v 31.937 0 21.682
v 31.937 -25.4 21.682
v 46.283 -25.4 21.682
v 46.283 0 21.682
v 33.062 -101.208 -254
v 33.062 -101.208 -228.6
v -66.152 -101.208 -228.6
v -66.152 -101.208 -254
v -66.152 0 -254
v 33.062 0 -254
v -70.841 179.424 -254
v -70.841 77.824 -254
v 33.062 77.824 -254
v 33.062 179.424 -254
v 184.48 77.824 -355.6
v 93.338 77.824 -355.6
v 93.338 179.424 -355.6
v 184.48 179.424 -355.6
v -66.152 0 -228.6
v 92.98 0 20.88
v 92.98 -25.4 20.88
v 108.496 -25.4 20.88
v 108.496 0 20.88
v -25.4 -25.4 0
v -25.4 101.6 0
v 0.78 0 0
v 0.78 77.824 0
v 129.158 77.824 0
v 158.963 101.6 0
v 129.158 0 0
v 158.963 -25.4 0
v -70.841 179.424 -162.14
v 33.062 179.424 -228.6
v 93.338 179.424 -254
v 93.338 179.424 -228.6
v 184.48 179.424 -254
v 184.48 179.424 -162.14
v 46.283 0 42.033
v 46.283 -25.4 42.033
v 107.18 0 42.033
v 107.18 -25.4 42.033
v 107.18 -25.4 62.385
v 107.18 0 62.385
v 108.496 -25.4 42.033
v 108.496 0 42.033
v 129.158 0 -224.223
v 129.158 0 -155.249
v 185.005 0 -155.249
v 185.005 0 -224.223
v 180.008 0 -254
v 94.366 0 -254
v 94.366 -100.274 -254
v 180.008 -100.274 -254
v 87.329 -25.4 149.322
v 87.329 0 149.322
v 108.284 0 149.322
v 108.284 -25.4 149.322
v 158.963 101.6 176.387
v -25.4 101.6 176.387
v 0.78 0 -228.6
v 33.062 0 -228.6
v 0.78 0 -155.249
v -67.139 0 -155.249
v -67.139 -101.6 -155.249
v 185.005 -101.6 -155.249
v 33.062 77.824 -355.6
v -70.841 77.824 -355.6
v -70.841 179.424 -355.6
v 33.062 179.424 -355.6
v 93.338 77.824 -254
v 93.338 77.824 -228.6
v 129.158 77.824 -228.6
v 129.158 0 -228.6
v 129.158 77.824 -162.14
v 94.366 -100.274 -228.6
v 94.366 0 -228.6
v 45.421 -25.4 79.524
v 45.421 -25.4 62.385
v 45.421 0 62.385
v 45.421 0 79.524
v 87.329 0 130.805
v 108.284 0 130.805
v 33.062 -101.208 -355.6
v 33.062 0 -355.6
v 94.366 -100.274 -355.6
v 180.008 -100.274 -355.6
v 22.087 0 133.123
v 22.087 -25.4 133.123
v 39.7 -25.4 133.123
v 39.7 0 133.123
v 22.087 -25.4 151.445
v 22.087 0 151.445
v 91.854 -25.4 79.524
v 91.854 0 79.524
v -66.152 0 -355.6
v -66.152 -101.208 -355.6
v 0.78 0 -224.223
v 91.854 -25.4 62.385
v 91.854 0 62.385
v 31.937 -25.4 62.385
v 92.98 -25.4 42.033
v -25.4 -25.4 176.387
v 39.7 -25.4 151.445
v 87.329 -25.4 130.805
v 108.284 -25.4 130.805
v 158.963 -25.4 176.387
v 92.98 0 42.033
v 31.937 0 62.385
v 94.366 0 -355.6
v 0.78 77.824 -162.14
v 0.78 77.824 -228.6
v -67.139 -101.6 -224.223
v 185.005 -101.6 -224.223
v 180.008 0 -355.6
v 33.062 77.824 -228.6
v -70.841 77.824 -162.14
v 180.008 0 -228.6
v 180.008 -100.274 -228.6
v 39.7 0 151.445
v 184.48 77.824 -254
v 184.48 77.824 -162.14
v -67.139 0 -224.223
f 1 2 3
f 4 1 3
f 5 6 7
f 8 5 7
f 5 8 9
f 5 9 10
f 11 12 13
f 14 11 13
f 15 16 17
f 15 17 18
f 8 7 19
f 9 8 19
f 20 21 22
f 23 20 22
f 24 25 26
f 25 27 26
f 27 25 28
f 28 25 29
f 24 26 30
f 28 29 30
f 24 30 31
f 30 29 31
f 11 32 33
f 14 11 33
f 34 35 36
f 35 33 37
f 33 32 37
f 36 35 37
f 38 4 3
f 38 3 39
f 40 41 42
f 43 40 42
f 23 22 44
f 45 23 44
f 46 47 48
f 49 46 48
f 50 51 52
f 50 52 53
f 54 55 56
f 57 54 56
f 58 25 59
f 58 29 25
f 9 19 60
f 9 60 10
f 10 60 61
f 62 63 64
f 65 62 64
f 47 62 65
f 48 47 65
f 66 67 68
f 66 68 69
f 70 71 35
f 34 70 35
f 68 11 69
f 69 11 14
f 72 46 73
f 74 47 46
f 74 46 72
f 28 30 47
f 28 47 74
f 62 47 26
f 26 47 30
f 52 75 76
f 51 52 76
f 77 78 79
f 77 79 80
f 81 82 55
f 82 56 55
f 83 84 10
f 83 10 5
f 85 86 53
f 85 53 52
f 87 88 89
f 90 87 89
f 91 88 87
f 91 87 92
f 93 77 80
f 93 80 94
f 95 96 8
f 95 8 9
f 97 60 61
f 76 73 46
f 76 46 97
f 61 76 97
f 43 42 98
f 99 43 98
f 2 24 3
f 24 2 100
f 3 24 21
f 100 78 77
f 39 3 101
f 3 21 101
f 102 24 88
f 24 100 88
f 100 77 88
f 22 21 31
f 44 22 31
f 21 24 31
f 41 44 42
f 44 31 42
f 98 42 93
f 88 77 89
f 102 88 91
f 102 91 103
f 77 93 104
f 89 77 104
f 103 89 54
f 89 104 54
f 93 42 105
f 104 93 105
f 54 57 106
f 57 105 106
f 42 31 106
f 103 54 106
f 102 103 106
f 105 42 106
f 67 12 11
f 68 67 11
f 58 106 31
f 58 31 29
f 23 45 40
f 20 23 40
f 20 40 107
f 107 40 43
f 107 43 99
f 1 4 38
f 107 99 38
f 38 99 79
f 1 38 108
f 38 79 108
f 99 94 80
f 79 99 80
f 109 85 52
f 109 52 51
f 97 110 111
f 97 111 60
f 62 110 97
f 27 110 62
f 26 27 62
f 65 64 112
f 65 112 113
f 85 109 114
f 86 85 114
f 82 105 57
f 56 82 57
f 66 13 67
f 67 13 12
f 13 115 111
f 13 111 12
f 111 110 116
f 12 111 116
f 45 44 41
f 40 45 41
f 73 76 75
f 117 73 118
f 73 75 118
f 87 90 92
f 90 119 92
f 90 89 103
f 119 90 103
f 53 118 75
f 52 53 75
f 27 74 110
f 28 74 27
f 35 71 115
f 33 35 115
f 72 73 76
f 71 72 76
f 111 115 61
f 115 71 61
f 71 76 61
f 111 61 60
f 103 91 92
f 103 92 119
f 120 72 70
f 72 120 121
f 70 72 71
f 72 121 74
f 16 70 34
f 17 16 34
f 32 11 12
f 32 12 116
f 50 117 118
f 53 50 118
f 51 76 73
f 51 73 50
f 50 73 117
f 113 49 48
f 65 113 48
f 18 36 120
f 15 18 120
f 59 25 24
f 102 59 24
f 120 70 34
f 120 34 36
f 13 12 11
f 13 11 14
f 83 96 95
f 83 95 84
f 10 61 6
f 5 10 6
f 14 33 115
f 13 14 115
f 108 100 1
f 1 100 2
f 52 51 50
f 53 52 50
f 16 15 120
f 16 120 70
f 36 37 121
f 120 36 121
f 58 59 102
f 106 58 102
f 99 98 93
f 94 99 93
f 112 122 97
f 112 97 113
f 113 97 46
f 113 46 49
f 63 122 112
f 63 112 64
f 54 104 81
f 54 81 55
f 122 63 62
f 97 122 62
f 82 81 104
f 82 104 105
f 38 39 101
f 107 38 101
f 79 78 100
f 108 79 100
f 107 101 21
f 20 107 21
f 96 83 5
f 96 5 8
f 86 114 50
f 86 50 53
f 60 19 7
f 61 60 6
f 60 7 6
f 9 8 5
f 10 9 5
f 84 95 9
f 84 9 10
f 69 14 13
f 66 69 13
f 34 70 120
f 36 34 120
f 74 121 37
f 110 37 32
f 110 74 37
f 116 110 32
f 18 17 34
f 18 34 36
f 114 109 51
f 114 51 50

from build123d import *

# Parameters (mm, degrees)
F0_W      = 133.5632354021
F0_H      = 176.386937499
F1_DEPTH  = 25.4
F2_W      = 17.6135022193
F2_H      = 18.3222442865
F2_W_2    = 20.9542885423
F2_H_2    = 18.5167938471
F3_DEPTH  = 25.4
F4_W      = 46.4338213205
F4_H      = 17.1390213072
F5_DEPTH  = 25.4
F6_W      = 133.5632354021
F6_H      = 176.386937499
F7_DEPTH  = 101.6
F8_W      = 77.5779262185
F8_H      = 77.8235793114
F9_DEPTH  = 25.4
F10_DEPTH = 203.2
F11_W     = 127
F11_H     = 176.386937499
F12_DEPTH = 25.4
F13_W     = 127
F13_H     = 176.386937499
F14_DEPTH = 25.4
F15_W     = 77.8235793114
F15_H     = 228.6
F16_DEPTH = 25.4
F17_W     = 77.8235793114
F17_H     = 228.6
F18_DEPTH = 25.4
F19_W     = 255.3215101361
F19_H     = 66.4603160381
F20_DEPTH = 101.6
F21_W     = 252.1445453167
F21_H     = 68.9742416143
F22_DEPTH = 101.6
F24_DEPTH = 25.4
F25_DEPTH = 101.6


with BuildPart() as f1:
    # F0 (on Front) → F1 (new body)
    with BuildSketch(Plane.XZ):
        with Locations((66.7816177011, 88.1934687495)):
            Rectangle(F0_W, F0_H)
    extrude(amount=F1_DEPTH)

    # F2 (on face) → F3 (cut)
    with BuildSketch(Plane.XZ.offset(25.4)):
        with Locations((30.893410556, 142.2838047147)):
            Rectangle(F2_W, F2_H)
        with Locations((97.8064127266, 140.0636956096)):
            Rectangle(F2_W_2, F2_H_2)
        Polygon((46.2829731405, 62.3850859702), (31.936828047, 62.3850859702), (31.936828047, 21.6817818582), (46.2829731405, 21.6817818582), (46.2829731405, 42.0334339142), align=None)
        Polygon((107.1797758341, 62.3850859702), (46.2829731405, 62.3850859702), (46.2829731405, 42.0334339142), (92.9804593325, 42.0334339142), (107.1797758341, 42.0334339142), align=None)
        Polygon((107.1797758341, 42.0334339142), (92.9804593325, 42.0334339142), (92.9804593325, 20.8803080022), (108.4958016872, 20.8803080022), (108.4958016872, 42.0334339142), align=None)
    extrude(amount=-F3_DEPTH, mode=Mode.SUBTRACT)

    # F4 (on face) → F5 (cut)
    with BuildSketch(Plane.XZ.offset(25.4)):
        with Locations((68.6374306679, 70.9545966238)):
            Rectangle(F4_W, F4_H)
    extrude(amount=-F5_DEPTH, mode=Mode.SUBTRACT)

    # F6 (on face) → F7 (join)
    with BuildSketch(Plane(origin=(0, 0, 0), x_dir=(-1, 0, 0), z_dir=(0, 1, 0))):
        with Locations((-66.7816177011, 88.1934687495)):
            Rectangle(F6_W, F6_H)
    extrude(amount=F7_DEPTH)

    # F8 (on face) → F9 (join)
    with BuildSketch(Plane(origin=(0, 0, 0), x_dir=(1, 0, 0), z_dir=(0, 0, -1))):
        with Locations((64.9688206613, -38.9117896557)):
            Rectangle(F8_W, F8_H)
    extrude(amount=F9_DEPTH)

    # F10 (add): a face of the model
    f10_faces = [f1.faces().sort_by_distance(p)[0] for p in [
        (64.9688206613, 38.9117896557, -25.4),
    ]]
    extrude(f10_faces, amount=F10_DEPTH)

    # F11 (on face) → F12 (join)
    with BuildSketch(Plane.YZ.offset(133.5632354021)):
        with Locations((38.1, 88.1934687495)):
            Rectangle(F11_W, F11_H)
    extrude(amount=F12_DEPTH)

    # F13 (on face) → F14 (join)
    with BuildSketch(Plane(origin=(0, 0, 0), x_dir=(0, -1, 0), z_dir=(-1, 0, 0))):
        with Locations((-38.1, 88.1934687495)):
            Rectangle(F13_W, F13_H)
    extrude(amount=F14_DEPTH)

    # F15 (on face) → F16 (join)
    with BuildSketch(Plane.YZ.offset(103.7577837706)):
        with Locations((38.9117896557, -114.3)):
            Rectangle(F15_W, F15_H)
    extrude(amount=F16_DEPTH)

    # F17 (on face) → F18 (join)
    with BuildSketch(Plane(origin=(26.1798575521, 0, 0), x_dir=(0, -1, 0), z_dir=(-1, 0, 0))):
        with Locations((-38.9117896557, -114.3)):
            Rectangle(F17_W, F17_H)
    extrude(amount=F18_DEPTH)

    # F19 (on face) → F20 (join)
    with BuildSketch(Plane(origin=(0, 77.8235793114, 0), x_dir=(-1, 0, 0), z_dir=(0, 1, 0))):
        with Locations((-56.8195097148, -195.3698419809)):
            Rectangle(F19_W, F19_H)
    extrude(amount=F20_DEPTH)

    # F21 (on face) → F22 (join)
    with BuildSketch(Plane.XZ):
        with Locations((58.9327961206, -189.7357627749)):
            Rectangle(F21_W, F21_H)
    extrude(amount=F22_DEPTH)

    # F23 (on face) → F24 (join)
    with BuildSketch(Plane(origin=(0, 0, -228.6), x_dir=(1, 0, 0), z_dir=(0, 0, -1))):
        Polygon((184.4802647829, -77.8235793114), (129.1577837706, -77.8235793114), (93.3377295732, -77.8235793114), (93.3377295732, -179.4235793114), (184.4802647829, -179.4235793114), align=None)
        Polygon((33.0623611808, -77.8235793114), (0.7798575521, -77.8235793114), (-70.8412453532, -77.8235793114), (-70.8412453532, -179.4235793114), (33.0623611808, -179.4235793114), align=None)
        Polygon((0.7798575521, 0), (33.0623611808, 0), (33.0623611808, 101.2079268694), (-66.15203619, 101.2079268694), (-66.15203619, 0), align=None)
        Polygon((180.0081729889, 0), (180.0081729889, 100.274309516), (94.3664237857, 100.274309516), (94.3664237857, 0), (129.1577837706, 0), align=None)
    extrude(amount=F24_DEPTH)


with BuildPart() as f25:
    # F25 (new): a face of the model
    f25_faces = [f1.part.faces().sort_by_distance(p)[0] for p in [
        (137.1872983873, -50.137154758, -254),
    ]]
    extrude(f25_faces, amount=F25_DEPTH)


with BuildPart() as f25b:
    # F25#2 (new): a face of the model
    f25_2_faces = [f1.part.faces().sort_by_distance(p)[0] for p in [
        (-16.5448375046, -50.6039634347, -254),
    ]]
    extrude(f25_2_faces, amount=F25_DEPTH)


with BuildPart() as f25c:
    # F25#3 (new): a face of the model
    f25_3_faces = [f1.part.faces().sort_by_distance(p)[0] for p in [
        (-18.8894420862, 128.6235793114, -254),
    ]]
    extrude(f25_3_faces, amount=F25_DEPTH)


with BuildPart() as f25d:
    # F25#4 (new): a face of the model
    f25_4_faces = [f1.part.faces().sort_by_distance(p)[0] for p in [
        (138.9089971781, 128.6235793114, -254),
    ]]
    extrude(f25_4_faces, amount=F25_DEPTH)


solid = Compound([f1.part, f25.part, f25b.part, f25c.part, f25d.part])
